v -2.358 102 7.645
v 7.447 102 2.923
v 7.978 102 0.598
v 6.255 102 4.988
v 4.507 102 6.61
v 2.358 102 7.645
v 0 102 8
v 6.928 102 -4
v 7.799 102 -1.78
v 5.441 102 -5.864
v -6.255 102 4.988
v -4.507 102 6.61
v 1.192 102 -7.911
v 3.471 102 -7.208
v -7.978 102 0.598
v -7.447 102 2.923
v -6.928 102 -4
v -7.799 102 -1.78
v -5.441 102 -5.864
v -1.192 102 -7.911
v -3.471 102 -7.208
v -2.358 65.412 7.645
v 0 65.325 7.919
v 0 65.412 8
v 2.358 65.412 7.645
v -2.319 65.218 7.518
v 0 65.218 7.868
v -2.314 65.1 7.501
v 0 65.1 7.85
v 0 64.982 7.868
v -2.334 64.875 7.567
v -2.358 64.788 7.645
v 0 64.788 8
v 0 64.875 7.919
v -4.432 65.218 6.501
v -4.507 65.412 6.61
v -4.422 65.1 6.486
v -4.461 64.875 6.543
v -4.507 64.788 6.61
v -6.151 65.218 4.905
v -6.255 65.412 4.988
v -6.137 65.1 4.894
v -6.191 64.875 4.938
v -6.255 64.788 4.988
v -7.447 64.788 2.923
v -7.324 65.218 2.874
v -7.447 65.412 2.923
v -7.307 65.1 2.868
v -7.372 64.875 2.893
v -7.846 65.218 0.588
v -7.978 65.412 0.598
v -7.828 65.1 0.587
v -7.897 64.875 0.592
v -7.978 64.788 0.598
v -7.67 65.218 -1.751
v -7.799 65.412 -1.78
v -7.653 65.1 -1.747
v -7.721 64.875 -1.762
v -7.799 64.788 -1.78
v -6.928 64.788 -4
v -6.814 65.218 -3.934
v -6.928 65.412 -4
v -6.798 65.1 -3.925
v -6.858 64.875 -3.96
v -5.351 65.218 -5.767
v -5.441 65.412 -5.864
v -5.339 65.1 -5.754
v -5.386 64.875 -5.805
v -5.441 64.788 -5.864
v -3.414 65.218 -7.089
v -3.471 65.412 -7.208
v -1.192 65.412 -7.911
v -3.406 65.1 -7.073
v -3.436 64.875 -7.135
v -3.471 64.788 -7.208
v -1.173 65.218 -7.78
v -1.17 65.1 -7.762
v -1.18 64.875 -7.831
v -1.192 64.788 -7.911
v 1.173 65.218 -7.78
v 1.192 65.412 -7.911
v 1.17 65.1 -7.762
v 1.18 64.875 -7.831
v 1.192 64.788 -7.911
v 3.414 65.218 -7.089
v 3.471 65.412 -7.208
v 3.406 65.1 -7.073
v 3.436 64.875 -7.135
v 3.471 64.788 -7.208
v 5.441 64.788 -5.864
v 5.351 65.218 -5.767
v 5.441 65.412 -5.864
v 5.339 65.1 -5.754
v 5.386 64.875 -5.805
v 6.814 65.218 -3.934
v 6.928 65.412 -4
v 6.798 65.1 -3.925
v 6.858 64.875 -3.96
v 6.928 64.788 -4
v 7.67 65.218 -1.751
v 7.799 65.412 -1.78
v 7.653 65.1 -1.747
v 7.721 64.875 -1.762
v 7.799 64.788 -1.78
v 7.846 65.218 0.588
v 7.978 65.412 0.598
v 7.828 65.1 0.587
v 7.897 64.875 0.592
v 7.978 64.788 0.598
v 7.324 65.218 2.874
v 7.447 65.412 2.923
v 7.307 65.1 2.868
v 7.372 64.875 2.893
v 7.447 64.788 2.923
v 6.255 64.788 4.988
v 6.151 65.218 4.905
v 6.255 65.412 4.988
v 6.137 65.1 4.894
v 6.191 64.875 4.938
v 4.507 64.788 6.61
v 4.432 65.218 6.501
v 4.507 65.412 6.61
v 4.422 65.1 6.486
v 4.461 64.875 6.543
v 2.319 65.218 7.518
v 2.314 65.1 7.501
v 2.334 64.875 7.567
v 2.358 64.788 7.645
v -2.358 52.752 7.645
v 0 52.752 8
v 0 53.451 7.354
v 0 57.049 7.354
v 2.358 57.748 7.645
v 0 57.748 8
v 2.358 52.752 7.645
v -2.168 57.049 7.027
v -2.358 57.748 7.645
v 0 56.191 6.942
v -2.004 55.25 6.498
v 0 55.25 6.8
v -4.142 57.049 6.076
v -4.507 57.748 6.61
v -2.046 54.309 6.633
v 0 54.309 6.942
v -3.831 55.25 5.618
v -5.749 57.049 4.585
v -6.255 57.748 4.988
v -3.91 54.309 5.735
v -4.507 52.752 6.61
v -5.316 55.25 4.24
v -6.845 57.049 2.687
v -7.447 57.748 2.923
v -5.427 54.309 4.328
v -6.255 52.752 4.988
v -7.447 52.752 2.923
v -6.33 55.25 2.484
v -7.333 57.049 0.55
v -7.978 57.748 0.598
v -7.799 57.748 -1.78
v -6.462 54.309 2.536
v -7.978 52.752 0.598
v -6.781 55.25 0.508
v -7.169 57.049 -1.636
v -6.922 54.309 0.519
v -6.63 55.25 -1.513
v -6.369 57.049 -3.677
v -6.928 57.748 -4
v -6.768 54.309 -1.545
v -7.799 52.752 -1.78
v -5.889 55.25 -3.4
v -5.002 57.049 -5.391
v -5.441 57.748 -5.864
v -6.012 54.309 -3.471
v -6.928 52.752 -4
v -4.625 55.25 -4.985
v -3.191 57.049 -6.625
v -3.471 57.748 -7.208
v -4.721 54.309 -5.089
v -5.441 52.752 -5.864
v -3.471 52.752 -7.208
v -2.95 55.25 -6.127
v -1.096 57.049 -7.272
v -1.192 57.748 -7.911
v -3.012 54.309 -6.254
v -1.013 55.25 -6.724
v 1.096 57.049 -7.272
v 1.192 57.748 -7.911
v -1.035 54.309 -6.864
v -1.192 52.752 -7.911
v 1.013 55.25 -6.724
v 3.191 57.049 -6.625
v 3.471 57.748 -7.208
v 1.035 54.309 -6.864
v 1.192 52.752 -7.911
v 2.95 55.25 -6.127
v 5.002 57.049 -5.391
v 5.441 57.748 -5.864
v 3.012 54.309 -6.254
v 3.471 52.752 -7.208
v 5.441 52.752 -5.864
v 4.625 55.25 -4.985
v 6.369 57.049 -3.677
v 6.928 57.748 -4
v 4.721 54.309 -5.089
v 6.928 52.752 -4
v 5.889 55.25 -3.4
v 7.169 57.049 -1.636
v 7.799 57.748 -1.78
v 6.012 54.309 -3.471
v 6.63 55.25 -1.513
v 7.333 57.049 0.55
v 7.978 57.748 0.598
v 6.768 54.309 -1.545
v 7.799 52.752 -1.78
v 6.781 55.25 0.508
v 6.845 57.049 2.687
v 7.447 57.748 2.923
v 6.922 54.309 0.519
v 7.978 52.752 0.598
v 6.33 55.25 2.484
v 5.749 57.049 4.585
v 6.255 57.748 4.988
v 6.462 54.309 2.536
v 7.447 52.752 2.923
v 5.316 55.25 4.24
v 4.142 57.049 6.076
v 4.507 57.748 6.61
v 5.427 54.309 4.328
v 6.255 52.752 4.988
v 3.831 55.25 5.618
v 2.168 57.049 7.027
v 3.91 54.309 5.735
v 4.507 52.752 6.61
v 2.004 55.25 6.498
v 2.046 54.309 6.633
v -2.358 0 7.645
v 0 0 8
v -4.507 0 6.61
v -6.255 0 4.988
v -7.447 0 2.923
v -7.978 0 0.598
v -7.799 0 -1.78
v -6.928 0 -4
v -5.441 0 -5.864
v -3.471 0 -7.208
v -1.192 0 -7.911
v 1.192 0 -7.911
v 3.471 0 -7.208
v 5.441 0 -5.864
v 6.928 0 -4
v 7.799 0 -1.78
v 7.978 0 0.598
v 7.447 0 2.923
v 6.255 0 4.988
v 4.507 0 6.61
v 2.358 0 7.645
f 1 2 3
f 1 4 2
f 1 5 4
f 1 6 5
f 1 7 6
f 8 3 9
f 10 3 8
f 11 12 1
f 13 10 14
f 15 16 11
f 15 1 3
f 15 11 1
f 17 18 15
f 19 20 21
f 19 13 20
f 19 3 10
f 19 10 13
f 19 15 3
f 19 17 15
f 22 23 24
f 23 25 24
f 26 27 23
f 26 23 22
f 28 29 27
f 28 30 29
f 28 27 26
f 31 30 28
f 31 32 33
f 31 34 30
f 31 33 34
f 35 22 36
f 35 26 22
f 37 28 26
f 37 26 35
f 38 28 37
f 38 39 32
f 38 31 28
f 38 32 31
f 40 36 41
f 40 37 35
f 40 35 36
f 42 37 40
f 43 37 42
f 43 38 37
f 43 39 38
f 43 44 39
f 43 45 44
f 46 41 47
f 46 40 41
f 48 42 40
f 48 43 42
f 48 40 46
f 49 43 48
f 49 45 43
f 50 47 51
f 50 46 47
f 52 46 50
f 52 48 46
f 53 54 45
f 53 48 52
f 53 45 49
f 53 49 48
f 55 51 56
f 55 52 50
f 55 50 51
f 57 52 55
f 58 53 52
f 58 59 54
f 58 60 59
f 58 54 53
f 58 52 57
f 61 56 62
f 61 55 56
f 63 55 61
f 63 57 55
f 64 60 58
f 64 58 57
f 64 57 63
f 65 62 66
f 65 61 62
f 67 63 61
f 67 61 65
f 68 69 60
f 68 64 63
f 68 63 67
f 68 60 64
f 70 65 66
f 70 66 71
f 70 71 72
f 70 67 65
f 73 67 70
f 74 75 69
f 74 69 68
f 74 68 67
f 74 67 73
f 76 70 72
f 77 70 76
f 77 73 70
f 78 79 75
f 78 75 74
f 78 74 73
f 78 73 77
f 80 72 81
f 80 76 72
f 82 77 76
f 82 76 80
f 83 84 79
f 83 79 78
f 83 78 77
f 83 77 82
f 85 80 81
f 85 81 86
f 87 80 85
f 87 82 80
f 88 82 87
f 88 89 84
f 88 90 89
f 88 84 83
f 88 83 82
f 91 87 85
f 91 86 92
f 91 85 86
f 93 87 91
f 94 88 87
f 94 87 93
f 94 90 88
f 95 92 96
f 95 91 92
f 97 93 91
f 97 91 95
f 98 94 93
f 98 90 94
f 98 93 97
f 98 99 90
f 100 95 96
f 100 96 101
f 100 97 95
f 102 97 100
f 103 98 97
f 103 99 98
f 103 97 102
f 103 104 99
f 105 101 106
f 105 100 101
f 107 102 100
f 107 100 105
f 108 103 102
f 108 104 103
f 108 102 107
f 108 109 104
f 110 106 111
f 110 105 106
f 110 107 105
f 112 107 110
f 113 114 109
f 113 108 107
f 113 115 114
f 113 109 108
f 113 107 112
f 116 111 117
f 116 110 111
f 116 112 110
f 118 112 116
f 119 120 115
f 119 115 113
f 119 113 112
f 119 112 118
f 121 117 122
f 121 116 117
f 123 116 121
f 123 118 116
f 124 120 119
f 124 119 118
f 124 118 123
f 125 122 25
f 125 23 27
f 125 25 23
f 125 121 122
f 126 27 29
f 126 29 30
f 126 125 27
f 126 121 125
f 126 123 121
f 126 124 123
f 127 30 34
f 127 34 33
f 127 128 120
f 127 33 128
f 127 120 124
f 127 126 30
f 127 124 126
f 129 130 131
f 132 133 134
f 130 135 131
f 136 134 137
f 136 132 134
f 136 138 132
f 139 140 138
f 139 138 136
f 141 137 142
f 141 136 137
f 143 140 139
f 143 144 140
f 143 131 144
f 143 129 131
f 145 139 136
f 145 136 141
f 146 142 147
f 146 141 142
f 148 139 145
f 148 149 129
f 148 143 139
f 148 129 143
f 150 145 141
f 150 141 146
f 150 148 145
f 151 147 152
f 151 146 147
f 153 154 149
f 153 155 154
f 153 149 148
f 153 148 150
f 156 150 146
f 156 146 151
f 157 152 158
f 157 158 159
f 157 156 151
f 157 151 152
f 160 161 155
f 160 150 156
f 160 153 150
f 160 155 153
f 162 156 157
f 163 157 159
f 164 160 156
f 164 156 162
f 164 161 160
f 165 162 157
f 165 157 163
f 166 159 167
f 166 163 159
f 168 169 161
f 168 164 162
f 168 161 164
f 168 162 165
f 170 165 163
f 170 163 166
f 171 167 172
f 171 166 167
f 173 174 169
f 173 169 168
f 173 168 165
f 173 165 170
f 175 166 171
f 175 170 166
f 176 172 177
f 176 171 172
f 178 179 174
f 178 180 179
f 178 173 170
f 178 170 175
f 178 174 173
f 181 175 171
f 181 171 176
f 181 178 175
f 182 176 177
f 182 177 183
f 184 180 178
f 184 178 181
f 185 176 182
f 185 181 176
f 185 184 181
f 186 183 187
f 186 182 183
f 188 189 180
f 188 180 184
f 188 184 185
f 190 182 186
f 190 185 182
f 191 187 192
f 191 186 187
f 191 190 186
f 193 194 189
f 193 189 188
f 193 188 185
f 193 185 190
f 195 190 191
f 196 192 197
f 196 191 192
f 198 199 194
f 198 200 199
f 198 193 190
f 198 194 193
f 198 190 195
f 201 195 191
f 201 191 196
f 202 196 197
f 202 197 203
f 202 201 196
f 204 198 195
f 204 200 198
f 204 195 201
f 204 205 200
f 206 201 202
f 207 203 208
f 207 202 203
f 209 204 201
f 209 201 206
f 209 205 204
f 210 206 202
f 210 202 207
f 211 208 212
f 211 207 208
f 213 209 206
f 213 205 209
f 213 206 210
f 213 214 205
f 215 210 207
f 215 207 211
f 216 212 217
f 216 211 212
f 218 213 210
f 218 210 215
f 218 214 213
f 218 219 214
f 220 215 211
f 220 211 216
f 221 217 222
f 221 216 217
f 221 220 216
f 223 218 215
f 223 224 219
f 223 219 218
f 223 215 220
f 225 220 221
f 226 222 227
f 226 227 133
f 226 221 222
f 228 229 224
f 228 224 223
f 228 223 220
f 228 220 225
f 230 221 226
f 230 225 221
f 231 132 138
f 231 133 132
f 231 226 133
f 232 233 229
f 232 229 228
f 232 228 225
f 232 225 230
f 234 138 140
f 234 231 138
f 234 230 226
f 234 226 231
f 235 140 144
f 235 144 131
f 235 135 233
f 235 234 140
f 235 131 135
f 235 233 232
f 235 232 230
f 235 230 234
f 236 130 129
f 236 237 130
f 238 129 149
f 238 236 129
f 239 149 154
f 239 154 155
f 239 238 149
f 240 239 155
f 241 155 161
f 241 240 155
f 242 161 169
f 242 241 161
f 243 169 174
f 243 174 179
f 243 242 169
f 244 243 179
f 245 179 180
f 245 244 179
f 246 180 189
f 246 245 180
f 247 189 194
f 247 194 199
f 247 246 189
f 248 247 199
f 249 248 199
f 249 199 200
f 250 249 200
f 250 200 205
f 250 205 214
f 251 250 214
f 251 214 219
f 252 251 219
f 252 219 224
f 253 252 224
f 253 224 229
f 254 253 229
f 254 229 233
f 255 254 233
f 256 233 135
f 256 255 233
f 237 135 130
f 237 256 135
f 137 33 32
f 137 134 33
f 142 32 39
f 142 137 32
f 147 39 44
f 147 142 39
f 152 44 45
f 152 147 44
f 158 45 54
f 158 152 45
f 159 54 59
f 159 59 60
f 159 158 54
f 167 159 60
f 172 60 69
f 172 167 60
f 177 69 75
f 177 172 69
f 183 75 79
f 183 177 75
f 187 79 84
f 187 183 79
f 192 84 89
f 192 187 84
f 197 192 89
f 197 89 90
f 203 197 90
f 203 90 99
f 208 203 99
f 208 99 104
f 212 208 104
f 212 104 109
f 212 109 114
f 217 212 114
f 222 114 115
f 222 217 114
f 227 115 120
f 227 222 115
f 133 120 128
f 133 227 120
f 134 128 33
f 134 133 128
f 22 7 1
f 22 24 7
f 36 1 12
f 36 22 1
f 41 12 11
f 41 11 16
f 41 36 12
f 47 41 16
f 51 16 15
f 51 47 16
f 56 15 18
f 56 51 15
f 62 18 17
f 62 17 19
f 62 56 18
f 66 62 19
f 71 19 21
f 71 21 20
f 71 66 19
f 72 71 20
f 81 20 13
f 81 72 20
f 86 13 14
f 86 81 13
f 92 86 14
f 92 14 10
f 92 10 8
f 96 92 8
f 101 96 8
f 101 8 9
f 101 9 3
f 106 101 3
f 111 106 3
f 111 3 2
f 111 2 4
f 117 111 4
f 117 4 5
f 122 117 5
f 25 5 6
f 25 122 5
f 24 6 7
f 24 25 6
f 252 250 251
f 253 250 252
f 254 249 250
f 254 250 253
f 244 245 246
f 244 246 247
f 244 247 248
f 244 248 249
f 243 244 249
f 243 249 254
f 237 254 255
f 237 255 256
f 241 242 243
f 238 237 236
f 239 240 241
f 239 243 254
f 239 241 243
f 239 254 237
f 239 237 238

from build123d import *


with BuildPart() as f1:
    # F0 (on Right) → F1 (revolve)
    with BuildSketch(Plane.YZ):
        with BuildLine():
            Line((0, 8), (0, 0))
            Line((0, 0), (102, 0))
            Line((102, 0), (102, 8))
            Line((102, 8), (65.41225, 8))
            ThreePointArc((65.41225, 8), (65.1, 7.85), (64.78775, 8))
            Line((64.78775, 8), (57.747999, 8))
            ThreePointArc((57.747999, 8), (55.25, 6.8), (52.752001, 8))
            Line((52.752001, 8), (0, 8))
        make_face()
    revolve(axis=Axis((0, 51, 0), (0, -1, 0)))


solid = f1.part
